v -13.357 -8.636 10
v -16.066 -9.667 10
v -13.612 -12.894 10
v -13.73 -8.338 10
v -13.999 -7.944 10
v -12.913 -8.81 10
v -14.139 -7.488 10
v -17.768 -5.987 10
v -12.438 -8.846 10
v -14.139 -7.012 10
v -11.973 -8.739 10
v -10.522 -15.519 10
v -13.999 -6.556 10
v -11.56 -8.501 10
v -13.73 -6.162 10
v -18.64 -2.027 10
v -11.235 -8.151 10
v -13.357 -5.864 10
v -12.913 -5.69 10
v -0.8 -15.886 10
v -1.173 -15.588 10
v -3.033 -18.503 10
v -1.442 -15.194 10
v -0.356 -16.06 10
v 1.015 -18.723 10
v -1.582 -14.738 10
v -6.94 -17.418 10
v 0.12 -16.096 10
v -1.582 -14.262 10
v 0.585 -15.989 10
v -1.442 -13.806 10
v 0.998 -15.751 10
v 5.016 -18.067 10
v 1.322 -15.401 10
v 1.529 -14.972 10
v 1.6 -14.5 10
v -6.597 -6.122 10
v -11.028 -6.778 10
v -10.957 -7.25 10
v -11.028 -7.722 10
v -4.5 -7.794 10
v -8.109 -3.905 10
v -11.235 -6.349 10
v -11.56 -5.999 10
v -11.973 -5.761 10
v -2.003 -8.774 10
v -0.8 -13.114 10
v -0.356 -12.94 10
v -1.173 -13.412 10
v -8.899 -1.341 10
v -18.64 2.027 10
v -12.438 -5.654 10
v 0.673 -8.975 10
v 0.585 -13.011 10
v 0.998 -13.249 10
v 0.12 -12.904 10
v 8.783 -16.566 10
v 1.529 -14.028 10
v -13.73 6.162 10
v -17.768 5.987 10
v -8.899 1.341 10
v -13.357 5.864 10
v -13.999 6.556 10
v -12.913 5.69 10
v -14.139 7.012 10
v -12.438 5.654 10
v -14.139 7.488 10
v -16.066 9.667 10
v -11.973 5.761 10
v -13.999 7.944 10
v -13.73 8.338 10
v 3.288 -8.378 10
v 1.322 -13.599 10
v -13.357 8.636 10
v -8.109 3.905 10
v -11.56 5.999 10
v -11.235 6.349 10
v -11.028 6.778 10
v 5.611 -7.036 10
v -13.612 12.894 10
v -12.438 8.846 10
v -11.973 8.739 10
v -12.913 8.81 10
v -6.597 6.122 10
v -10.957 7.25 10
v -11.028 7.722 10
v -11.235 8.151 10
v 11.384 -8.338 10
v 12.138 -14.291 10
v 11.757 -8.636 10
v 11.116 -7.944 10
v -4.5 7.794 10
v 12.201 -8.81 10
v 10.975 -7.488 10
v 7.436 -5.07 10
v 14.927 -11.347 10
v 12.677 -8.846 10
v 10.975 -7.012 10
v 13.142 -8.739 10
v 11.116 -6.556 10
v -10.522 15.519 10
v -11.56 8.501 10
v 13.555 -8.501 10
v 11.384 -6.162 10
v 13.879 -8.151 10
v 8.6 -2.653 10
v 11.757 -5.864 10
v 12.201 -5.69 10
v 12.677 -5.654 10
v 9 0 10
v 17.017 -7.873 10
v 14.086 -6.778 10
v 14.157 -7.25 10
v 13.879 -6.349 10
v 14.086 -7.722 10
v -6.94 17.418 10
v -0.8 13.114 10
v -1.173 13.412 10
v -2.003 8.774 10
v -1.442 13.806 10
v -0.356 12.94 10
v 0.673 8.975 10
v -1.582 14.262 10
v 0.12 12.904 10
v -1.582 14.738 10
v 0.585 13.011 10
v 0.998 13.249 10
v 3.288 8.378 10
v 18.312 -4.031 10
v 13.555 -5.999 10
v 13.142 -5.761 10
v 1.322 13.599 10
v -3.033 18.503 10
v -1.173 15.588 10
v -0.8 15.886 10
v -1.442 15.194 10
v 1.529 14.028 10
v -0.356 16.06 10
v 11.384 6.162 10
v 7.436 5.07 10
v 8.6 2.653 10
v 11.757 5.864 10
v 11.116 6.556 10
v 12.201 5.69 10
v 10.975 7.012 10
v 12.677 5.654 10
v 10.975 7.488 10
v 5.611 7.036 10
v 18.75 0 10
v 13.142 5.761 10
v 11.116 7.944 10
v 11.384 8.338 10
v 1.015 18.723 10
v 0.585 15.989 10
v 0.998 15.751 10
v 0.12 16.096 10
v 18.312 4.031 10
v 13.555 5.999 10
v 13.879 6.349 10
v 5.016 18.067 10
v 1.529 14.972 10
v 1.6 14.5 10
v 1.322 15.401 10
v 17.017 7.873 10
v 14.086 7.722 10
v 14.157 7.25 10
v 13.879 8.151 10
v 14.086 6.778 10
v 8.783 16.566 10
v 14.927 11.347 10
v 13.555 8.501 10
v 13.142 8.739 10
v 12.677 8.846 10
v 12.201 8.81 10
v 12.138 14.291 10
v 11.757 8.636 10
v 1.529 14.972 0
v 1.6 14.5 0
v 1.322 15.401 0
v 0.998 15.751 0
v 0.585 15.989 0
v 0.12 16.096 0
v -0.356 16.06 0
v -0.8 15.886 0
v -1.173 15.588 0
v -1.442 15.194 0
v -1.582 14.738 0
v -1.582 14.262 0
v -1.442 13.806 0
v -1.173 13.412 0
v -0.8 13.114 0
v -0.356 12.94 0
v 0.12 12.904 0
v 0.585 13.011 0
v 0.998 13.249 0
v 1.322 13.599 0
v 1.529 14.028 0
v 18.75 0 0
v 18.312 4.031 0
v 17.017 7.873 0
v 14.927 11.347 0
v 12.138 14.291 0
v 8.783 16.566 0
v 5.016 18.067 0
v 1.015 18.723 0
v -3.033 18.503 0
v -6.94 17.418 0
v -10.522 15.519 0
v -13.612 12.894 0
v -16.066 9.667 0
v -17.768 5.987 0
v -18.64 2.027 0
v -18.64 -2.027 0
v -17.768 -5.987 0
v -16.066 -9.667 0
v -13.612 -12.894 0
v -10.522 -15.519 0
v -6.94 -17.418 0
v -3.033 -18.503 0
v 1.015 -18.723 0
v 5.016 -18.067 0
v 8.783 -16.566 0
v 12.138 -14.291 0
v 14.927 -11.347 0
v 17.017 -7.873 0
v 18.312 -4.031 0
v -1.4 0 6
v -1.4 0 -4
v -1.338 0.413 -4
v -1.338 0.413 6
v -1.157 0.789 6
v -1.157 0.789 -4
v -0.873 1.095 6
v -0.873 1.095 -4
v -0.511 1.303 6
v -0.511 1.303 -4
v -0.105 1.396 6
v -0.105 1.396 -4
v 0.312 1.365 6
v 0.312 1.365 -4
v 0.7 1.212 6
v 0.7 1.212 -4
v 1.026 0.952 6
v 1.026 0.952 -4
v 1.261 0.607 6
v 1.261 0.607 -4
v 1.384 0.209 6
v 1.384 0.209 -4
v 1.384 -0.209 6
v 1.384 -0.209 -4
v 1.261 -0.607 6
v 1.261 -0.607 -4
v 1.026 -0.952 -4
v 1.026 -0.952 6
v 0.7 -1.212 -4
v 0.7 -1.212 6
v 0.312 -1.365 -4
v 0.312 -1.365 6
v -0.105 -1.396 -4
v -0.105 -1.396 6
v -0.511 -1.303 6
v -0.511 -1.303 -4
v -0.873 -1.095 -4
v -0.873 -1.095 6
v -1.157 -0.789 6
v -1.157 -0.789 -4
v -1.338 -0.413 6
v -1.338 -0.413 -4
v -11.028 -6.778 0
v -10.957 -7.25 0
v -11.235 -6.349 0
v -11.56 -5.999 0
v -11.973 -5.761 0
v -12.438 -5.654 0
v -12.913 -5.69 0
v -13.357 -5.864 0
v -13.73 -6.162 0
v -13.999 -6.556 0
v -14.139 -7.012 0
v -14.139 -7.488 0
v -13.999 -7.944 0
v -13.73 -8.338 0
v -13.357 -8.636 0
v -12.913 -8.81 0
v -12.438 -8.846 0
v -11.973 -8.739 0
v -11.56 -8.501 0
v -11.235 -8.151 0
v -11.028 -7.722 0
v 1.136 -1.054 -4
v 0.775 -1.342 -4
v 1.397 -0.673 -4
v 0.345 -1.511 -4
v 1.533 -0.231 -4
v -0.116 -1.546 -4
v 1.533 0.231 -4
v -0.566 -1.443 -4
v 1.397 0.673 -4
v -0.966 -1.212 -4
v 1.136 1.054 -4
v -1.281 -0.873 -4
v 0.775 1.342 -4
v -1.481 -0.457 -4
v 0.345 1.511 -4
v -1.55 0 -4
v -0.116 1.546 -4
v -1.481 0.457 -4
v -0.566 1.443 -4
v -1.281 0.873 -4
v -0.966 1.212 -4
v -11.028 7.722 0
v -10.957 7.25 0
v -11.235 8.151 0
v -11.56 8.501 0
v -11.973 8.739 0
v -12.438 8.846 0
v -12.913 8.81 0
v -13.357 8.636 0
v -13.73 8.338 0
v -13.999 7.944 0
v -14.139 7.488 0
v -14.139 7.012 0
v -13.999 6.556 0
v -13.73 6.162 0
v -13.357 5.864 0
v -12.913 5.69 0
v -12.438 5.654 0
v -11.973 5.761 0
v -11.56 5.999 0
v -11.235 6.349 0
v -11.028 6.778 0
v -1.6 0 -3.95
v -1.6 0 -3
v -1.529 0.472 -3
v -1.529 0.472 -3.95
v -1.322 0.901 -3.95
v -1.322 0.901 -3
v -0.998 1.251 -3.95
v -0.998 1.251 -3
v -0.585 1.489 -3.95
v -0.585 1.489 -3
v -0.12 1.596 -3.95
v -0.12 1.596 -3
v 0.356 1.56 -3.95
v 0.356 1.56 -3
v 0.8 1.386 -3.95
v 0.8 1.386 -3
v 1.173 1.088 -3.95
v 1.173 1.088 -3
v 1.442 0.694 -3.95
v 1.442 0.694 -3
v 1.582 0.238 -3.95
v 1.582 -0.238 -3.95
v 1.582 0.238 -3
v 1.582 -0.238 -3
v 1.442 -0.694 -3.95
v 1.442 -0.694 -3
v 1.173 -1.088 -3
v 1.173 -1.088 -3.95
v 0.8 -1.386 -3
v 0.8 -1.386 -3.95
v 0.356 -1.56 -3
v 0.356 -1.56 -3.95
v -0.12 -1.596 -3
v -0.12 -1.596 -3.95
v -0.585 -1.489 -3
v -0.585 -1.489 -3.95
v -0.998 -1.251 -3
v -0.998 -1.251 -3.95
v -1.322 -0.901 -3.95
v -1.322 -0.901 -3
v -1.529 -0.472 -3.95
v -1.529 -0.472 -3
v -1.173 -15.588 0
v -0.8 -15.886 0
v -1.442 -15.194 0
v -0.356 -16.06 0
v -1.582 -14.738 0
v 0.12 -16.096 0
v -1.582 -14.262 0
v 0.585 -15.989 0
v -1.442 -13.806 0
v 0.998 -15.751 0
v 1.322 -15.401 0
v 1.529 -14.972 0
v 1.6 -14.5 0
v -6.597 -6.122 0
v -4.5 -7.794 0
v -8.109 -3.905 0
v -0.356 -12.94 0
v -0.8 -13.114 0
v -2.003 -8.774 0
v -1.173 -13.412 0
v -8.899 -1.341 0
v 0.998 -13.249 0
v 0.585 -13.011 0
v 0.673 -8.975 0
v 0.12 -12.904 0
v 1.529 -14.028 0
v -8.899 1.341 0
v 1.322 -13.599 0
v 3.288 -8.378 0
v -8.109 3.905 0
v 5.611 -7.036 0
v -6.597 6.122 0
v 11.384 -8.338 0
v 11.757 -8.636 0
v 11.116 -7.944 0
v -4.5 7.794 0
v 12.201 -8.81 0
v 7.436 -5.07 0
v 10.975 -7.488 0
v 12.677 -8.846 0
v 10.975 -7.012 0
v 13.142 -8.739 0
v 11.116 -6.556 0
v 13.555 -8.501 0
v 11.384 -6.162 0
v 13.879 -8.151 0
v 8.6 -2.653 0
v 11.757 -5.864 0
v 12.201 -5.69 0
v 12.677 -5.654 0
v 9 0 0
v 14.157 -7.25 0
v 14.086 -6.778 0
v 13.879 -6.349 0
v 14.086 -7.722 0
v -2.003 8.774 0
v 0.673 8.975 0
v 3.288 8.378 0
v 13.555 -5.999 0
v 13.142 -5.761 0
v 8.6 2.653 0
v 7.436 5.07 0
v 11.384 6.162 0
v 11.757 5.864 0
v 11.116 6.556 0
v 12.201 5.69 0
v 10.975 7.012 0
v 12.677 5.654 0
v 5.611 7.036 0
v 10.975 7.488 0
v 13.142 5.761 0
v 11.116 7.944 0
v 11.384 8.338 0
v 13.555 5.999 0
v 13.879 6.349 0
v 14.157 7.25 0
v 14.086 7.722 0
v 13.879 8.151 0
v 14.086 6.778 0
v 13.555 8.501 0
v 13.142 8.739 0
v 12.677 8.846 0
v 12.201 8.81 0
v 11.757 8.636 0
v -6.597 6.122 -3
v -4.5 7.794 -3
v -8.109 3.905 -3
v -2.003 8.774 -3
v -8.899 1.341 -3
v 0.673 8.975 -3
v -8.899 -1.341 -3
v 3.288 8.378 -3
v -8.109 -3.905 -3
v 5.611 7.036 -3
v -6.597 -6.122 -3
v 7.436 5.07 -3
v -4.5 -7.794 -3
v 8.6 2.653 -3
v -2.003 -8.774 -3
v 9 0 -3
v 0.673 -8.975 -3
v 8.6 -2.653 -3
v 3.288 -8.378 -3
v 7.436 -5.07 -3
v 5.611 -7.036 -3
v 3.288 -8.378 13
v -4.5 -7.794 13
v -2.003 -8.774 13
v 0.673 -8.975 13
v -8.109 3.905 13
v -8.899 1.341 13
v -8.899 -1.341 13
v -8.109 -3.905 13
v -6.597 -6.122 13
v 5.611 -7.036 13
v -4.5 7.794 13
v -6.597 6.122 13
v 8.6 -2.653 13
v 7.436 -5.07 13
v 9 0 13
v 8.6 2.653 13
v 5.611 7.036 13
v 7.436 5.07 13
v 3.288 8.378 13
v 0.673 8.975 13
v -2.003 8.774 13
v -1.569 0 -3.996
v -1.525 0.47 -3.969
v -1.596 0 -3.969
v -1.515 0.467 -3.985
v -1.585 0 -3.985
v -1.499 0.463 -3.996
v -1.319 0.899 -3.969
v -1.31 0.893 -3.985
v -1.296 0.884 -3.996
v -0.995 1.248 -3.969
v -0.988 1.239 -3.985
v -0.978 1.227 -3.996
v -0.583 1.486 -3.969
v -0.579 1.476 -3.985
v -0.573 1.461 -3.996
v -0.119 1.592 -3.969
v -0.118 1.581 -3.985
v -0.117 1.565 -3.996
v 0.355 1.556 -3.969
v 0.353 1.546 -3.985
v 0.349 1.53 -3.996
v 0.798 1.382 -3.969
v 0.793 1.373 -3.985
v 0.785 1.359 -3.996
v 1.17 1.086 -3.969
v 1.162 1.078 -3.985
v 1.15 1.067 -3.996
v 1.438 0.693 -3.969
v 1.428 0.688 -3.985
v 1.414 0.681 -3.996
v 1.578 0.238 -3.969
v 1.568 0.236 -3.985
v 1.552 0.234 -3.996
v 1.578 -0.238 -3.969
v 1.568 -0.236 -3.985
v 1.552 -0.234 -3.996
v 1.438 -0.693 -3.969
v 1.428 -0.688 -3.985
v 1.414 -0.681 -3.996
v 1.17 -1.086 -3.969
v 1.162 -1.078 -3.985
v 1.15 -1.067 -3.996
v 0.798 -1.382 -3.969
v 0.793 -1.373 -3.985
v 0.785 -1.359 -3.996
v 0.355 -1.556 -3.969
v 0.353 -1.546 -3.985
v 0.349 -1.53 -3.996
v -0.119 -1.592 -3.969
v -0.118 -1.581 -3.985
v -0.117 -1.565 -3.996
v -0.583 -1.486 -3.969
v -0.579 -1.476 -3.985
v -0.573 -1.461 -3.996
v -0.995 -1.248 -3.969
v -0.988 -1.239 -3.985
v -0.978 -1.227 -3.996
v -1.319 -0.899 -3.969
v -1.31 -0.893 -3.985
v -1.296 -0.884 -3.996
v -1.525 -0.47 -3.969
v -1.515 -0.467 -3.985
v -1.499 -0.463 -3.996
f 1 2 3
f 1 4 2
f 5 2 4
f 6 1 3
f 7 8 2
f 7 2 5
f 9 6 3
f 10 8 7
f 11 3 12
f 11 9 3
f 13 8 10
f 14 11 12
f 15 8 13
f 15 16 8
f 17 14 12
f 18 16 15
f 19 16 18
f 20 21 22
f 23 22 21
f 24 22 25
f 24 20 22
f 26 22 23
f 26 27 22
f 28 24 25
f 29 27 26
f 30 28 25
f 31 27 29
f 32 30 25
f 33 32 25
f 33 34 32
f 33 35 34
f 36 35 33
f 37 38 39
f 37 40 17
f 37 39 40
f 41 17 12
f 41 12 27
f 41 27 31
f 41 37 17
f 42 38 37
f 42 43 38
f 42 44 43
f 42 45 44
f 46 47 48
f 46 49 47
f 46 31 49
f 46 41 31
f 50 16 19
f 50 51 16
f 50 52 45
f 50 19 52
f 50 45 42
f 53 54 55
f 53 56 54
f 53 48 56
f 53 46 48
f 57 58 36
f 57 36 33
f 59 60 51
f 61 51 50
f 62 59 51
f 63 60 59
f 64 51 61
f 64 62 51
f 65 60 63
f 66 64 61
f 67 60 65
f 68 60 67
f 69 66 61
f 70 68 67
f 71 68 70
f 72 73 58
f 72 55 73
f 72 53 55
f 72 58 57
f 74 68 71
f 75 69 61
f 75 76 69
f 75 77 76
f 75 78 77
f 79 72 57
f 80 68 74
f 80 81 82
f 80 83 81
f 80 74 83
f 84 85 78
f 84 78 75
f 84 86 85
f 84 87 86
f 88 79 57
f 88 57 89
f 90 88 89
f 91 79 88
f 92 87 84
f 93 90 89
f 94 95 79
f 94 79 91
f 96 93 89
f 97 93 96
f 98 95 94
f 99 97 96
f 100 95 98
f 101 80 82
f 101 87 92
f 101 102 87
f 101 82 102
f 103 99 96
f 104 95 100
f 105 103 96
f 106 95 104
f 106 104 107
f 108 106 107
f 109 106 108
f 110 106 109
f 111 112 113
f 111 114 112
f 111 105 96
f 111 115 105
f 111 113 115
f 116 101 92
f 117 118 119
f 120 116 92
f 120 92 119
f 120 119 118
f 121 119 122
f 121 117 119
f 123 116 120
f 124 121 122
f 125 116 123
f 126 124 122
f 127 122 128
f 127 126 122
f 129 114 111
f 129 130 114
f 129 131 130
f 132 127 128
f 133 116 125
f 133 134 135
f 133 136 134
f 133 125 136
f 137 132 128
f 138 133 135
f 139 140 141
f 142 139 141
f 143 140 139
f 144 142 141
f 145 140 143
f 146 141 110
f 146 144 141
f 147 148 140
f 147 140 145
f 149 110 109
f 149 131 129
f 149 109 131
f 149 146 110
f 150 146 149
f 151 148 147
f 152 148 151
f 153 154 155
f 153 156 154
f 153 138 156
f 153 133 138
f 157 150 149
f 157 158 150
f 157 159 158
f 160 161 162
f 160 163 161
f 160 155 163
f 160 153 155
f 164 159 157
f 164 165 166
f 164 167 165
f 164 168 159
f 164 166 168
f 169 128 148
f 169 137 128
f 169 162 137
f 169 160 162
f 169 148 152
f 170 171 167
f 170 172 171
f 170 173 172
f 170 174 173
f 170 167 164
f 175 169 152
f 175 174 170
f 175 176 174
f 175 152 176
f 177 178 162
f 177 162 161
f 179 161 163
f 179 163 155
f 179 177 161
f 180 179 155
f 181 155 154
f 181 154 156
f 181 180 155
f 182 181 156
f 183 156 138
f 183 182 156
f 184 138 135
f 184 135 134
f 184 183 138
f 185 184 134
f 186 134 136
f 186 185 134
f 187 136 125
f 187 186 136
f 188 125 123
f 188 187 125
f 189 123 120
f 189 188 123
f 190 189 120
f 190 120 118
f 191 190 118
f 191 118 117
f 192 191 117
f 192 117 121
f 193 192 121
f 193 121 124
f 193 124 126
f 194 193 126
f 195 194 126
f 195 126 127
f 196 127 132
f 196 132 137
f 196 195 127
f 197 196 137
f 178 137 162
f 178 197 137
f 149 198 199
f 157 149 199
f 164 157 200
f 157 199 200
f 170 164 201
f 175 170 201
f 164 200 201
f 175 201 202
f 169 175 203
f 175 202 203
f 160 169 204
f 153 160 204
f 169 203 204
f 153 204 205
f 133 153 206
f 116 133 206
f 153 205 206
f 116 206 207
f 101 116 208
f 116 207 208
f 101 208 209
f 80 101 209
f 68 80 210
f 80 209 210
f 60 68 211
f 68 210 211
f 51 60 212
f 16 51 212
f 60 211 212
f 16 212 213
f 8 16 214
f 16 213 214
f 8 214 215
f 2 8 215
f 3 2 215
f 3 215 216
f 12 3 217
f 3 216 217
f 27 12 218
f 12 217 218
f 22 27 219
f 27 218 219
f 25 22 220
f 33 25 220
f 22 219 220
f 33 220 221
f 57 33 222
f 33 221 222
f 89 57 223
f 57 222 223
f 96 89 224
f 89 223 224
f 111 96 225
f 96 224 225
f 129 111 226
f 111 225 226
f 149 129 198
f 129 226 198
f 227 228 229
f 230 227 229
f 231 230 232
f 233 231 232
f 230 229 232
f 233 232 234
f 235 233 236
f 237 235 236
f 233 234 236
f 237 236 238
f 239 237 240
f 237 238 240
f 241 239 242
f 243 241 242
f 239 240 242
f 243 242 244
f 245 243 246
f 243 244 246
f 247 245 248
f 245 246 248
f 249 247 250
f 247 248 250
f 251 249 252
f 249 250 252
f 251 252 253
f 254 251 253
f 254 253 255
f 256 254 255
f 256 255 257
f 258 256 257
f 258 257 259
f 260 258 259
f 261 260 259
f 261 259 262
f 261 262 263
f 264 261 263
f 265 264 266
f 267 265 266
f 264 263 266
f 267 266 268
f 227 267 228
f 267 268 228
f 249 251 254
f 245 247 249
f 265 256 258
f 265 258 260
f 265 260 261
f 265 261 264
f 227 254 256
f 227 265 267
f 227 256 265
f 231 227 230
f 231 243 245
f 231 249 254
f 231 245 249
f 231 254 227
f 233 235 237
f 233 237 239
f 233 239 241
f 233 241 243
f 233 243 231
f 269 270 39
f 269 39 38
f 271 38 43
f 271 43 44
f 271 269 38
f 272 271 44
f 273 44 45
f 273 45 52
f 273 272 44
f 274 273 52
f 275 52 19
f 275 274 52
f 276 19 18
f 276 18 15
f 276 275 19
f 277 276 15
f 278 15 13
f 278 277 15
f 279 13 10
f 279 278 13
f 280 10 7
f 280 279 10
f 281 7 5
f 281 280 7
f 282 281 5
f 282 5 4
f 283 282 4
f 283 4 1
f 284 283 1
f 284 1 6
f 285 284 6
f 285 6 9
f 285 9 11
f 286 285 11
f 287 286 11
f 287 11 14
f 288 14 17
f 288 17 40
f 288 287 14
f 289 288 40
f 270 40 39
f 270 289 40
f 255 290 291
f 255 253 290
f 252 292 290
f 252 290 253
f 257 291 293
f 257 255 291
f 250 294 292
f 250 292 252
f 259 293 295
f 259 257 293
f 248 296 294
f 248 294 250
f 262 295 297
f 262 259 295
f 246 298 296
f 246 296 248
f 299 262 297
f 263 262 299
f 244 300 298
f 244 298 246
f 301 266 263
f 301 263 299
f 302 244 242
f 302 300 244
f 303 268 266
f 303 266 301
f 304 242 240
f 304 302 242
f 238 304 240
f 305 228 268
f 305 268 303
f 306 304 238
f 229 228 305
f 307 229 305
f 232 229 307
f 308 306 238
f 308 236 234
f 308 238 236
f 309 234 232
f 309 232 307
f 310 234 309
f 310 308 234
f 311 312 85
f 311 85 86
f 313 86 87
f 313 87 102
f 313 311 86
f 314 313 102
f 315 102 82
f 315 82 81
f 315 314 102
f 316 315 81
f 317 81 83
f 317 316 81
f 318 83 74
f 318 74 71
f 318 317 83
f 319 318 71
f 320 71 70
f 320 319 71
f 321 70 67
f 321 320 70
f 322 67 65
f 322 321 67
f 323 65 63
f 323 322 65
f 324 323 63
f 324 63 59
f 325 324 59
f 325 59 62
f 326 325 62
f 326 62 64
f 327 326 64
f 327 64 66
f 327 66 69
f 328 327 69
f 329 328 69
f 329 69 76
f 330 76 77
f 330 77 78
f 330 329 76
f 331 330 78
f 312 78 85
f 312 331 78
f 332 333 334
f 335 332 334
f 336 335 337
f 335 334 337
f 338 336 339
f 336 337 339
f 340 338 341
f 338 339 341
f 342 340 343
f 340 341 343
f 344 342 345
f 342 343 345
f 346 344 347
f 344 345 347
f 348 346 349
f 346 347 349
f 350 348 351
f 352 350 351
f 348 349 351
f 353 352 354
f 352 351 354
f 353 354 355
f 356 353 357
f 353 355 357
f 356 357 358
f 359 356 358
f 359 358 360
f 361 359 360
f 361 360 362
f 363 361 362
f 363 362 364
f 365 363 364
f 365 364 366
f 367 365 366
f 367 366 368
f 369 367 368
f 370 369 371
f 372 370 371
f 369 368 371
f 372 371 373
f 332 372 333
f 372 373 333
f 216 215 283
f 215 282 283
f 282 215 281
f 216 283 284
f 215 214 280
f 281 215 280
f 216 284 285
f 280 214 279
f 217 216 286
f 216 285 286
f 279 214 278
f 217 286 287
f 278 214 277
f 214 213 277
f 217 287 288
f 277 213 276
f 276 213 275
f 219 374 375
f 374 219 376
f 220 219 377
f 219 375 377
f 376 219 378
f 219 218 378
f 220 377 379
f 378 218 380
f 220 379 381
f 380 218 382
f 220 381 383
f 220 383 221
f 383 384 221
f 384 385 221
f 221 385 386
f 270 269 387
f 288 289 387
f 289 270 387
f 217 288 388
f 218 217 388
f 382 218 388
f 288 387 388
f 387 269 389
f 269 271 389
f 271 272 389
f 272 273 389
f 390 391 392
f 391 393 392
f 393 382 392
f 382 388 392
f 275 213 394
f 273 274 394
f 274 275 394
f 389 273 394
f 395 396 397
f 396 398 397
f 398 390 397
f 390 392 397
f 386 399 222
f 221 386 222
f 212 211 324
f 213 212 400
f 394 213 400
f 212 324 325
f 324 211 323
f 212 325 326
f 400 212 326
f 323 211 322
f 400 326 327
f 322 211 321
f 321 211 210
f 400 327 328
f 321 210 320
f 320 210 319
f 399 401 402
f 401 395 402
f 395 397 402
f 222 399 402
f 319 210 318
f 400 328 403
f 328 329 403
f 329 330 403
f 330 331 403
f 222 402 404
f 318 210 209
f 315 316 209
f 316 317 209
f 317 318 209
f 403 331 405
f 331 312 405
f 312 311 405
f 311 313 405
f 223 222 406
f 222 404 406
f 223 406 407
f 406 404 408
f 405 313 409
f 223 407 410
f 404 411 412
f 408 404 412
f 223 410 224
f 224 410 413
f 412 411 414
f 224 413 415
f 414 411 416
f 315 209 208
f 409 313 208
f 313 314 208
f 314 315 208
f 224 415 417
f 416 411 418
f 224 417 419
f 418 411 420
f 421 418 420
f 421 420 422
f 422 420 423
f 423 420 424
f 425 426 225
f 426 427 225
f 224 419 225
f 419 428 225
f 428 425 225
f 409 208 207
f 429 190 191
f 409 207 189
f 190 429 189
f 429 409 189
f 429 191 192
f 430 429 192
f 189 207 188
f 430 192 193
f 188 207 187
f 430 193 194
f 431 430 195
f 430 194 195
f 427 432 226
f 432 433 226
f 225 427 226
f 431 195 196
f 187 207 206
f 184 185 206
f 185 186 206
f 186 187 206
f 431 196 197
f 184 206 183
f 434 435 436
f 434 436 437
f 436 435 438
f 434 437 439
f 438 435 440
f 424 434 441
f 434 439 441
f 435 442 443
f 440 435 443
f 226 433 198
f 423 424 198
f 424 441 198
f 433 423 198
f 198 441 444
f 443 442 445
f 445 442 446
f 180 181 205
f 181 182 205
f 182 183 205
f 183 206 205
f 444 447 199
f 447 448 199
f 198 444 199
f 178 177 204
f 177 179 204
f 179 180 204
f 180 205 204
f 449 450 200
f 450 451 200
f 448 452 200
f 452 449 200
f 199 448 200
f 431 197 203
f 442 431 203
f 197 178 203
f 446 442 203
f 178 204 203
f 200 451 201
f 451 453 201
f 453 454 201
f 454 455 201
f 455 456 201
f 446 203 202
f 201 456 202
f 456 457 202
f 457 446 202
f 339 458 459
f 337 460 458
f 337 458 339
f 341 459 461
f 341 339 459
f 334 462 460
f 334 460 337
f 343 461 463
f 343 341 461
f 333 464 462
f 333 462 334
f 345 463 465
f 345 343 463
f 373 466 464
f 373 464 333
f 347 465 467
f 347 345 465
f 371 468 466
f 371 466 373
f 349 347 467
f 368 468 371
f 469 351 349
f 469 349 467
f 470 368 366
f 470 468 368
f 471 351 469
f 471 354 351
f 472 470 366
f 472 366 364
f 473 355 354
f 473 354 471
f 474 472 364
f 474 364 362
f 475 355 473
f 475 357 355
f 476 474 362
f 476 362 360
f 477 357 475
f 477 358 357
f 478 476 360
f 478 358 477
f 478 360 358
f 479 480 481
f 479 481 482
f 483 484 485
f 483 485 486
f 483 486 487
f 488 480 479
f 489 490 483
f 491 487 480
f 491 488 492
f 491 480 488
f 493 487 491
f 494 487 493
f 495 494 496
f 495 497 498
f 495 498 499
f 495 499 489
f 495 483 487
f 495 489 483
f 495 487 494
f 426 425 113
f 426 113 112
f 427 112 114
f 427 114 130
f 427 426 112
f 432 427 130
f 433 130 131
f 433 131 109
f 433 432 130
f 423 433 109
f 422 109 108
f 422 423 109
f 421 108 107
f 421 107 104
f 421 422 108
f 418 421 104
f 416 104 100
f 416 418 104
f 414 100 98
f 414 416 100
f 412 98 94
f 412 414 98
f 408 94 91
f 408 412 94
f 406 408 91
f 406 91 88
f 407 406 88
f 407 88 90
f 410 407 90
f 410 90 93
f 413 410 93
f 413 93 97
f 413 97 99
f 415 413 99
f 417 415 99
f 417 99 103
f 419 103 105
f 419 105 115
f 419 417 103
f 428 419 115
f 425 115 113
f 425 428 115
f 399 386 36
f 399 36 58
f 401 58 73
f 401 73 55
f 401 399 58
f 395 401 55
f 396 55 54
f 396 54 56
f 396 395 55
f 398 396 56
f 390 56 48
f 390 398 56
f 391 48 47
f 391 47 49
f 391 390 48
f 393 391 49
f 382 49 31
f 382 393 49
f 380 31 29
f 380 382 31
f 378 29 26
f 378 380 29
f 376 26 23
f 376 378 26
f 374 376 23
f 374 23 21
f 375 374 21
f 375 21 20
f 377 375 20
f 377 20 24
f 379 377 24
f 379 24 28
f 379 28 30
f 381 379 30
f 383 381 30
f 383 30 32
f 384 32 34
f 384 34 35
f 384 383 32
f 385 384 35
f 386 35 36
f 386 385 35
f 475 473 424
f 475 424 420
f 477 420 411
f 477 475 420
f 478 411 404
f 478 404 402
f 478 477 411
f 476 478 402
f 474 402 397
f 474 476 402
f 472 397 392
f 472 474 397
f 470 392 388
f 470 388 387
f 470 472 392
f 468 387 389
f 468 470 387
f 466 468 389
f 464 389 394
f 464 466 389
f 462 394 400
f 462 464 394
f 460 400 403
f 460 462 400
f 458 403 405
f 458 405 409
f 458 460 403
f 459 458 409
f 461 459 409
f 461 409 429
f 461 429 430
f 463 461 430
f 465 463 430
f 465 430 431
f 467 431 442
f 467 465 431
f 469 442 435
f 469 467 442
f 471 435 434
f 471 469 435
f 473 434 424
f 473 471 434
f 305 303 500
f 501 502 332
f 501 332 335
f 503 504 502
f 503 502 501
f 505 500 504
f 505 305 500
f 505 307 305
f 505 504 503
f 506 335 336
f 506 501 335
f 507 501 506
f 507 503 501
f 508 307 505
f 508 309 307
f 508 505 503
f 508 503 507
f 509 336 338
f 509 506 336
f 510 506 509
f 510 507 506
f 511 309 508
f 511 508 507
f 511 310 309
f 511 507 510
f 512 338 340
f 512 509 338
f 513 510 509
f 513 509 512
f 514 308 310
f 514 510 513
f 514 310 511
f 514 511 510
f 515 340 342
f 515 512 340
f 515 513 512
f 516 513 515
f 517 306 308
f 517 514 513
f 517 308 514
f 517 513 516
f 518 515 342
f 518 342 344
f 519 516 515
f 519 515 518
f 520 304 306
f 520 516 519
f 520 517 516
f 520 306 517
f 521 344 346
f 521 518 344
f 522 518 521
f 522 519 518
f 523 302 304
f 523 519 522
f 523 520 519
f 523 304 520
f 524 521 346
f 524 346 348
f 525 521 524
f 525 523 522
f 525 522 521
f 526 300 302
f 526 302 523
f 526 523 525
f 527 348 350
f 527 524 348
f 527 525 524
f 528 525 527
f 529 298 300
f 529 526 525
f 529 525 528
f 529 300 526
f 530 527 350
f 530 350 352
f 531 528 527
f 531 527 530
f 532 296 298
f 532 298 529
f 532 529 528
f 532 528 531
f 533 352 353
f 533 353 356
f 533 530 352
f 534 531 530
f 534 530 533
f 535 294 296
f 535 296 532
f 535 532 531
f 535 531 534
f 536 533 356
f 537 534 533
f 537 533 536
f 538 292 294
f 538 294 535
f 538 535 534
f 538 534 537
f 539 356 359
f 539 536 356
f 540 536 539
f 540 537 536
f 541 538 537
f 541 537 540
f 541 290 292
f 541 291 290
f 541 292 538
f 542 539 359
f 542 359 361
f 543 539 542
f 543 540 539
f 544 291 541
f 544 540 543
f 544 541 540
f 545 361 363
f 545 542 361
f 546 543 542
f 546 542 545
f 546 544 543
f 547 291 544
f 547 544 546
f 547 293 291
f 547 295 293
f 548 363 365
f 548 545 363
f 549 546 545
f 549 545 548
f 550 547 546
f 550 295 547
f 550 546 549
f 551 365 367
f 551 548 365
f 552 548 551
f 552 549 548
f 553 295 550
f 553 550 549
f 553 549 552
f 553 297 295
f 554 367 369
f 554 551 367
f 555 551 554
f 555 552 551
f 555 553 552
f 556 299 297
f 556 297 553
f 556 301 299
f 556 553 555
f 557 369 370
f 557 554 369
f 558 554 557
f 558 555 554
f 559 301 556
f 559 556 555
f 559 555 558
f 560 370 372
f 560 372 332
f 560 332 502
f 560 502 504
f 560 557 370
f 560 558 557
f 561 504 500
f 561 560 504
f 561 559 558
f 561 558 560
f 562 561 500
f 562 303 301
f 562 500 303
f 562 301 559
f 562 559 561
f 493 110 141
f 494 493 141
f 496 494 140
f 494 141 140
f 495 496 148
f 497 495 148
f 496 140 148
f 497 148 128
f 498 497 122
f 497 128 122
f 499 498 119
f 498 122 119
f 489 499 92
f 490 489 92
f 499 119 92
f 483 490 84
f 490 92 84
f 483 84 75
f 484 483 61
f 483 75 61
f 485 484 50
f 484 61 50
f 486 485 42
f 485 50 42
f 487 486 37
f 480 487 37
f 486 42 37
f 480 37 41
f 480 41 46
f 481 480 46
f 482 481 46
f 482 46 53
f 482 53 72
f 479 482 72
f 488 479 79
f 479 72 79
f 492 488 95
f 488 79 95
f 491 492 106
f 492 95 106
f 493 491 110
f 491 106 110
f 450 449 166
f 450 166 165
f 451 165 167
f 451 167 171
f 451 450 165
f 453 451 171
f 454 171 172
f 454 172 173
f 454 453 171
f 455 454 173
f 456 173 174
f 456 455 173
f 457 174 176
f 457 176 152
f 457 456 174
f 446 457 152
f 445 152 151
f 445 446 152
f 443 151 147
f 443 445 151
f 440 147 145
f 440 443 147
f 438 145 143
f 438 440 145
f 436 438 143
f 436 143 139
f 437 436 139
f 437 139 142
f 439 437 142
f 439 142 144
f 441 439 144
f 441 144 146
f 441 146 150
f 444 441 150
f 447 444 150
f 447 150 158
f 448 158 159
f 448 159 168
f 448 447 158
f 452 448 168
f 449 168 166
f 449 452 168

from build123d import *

# Parameters (mm, degrees)
SKETCH2_R           = 18.75
SKETCH2_R_2         = 1.6
BOSS_EXTRUDE1_DEPTH = 10
SKETCH3_R           = 9
BOSS_EXTRUDE2_DEPTH = 3
BOSS_EXTRUDE4_START = 3
SKETCH6_R           = 9
BOSS_EXTRUDE4_DEPTH = 3
SKETCH7_R           = 1.6
BOSS_EXTRUDE5_DEPTH = 1
FILLET2_R           = 0.05
SKETCH9_R           = 1.4
CUT_EXTRUDE1_DEPTH  = 10


with BuildPart() as part:
    # Sketch2 → Boss-Extrude1 (new body)
    with BuildSketch(Plane.XY):
        Circle(SKETCH2_R)
        with Locations((0, 14.5)):
            Circle(SKETCH2_R_2, mode=Mode.SUBTRACT)
        with Locations((12.557368355, 7.25)):
            Circle(SKETCH2_R_2, mode=Mode.SUBTRACT)
        with Locations((12.557368355, -7.25)):
            Circle(SKETCH2_R_2, mode=Mode.SUBTRACT)
        with Locations((0, -14.5)):
            Circle(SKETCH2_R_2, mode=Mode.SUBTRACT)
        with Locations((-12.557368355, -7.25)):
            Circle(SKETCH2_R_2, mode=Mode.SUBTRACT)
        with Locations((-12.557368355, 7.25)):
            Circle(SKETCH2_R_2, mode=Mode.SUBTRACT)
    extrude(amount=BOSS_EXTRUDE1_DEPTH)

    # Sketch3 → Boss-Extrude2 (add)
    with BuildSketch(Plane.XY.offset(10)):
        Circle(SKETCH3_R)
    extrude(amount=BOSS_EXTRUDE2_DEPTH)

    # Sketch6 → Boss-Extrude4 (add)
    with BuildSketch(Plane(origin=(0, 0, 0), x_dir=(-1, 0, 0), z_dir=(0, 0, -1)).offset(BOSS_EXTRUDE4_START)):
        with Locations(Location((0, 0, 0), (0, 0, 180))):
            Circle(SKETCH6_R)
    extrude(amount=-BOSS_EXTRUDE4_DEPTH)

    # Sketch7 → Boss-Extrude5 (add)
    with BuildSketch(Plane(origin=(0, 0, -3), x_dir=(-1, 0, 0), z_dir=(0, 0, -1))):
        Circle(SKETCH7_R)
    extrude(amount=BOSS_EXTRUDE5_DEPTH)

    # Fillet2
    fillet2_edges = [part.edges().sort_by_distance(p)[0] for p in [
        (1.6, 0, -4),
    ]]
    fillet(fillet2_edges, radius=FILLET2_R)

    # Sketch9 → Cut-Extrude1 (cut)
    with BuildSketch(Plane(origin=(0, 0, -4), x_dir=(-1, 0, 0), z_dir=(0, 0, -1))):
        Circle(SKETCH9_R)
    extrude(amount=-CUT_EXTRUDE1_DEPTH, mode=Mode.SUBTRACT)


solid = part.part
